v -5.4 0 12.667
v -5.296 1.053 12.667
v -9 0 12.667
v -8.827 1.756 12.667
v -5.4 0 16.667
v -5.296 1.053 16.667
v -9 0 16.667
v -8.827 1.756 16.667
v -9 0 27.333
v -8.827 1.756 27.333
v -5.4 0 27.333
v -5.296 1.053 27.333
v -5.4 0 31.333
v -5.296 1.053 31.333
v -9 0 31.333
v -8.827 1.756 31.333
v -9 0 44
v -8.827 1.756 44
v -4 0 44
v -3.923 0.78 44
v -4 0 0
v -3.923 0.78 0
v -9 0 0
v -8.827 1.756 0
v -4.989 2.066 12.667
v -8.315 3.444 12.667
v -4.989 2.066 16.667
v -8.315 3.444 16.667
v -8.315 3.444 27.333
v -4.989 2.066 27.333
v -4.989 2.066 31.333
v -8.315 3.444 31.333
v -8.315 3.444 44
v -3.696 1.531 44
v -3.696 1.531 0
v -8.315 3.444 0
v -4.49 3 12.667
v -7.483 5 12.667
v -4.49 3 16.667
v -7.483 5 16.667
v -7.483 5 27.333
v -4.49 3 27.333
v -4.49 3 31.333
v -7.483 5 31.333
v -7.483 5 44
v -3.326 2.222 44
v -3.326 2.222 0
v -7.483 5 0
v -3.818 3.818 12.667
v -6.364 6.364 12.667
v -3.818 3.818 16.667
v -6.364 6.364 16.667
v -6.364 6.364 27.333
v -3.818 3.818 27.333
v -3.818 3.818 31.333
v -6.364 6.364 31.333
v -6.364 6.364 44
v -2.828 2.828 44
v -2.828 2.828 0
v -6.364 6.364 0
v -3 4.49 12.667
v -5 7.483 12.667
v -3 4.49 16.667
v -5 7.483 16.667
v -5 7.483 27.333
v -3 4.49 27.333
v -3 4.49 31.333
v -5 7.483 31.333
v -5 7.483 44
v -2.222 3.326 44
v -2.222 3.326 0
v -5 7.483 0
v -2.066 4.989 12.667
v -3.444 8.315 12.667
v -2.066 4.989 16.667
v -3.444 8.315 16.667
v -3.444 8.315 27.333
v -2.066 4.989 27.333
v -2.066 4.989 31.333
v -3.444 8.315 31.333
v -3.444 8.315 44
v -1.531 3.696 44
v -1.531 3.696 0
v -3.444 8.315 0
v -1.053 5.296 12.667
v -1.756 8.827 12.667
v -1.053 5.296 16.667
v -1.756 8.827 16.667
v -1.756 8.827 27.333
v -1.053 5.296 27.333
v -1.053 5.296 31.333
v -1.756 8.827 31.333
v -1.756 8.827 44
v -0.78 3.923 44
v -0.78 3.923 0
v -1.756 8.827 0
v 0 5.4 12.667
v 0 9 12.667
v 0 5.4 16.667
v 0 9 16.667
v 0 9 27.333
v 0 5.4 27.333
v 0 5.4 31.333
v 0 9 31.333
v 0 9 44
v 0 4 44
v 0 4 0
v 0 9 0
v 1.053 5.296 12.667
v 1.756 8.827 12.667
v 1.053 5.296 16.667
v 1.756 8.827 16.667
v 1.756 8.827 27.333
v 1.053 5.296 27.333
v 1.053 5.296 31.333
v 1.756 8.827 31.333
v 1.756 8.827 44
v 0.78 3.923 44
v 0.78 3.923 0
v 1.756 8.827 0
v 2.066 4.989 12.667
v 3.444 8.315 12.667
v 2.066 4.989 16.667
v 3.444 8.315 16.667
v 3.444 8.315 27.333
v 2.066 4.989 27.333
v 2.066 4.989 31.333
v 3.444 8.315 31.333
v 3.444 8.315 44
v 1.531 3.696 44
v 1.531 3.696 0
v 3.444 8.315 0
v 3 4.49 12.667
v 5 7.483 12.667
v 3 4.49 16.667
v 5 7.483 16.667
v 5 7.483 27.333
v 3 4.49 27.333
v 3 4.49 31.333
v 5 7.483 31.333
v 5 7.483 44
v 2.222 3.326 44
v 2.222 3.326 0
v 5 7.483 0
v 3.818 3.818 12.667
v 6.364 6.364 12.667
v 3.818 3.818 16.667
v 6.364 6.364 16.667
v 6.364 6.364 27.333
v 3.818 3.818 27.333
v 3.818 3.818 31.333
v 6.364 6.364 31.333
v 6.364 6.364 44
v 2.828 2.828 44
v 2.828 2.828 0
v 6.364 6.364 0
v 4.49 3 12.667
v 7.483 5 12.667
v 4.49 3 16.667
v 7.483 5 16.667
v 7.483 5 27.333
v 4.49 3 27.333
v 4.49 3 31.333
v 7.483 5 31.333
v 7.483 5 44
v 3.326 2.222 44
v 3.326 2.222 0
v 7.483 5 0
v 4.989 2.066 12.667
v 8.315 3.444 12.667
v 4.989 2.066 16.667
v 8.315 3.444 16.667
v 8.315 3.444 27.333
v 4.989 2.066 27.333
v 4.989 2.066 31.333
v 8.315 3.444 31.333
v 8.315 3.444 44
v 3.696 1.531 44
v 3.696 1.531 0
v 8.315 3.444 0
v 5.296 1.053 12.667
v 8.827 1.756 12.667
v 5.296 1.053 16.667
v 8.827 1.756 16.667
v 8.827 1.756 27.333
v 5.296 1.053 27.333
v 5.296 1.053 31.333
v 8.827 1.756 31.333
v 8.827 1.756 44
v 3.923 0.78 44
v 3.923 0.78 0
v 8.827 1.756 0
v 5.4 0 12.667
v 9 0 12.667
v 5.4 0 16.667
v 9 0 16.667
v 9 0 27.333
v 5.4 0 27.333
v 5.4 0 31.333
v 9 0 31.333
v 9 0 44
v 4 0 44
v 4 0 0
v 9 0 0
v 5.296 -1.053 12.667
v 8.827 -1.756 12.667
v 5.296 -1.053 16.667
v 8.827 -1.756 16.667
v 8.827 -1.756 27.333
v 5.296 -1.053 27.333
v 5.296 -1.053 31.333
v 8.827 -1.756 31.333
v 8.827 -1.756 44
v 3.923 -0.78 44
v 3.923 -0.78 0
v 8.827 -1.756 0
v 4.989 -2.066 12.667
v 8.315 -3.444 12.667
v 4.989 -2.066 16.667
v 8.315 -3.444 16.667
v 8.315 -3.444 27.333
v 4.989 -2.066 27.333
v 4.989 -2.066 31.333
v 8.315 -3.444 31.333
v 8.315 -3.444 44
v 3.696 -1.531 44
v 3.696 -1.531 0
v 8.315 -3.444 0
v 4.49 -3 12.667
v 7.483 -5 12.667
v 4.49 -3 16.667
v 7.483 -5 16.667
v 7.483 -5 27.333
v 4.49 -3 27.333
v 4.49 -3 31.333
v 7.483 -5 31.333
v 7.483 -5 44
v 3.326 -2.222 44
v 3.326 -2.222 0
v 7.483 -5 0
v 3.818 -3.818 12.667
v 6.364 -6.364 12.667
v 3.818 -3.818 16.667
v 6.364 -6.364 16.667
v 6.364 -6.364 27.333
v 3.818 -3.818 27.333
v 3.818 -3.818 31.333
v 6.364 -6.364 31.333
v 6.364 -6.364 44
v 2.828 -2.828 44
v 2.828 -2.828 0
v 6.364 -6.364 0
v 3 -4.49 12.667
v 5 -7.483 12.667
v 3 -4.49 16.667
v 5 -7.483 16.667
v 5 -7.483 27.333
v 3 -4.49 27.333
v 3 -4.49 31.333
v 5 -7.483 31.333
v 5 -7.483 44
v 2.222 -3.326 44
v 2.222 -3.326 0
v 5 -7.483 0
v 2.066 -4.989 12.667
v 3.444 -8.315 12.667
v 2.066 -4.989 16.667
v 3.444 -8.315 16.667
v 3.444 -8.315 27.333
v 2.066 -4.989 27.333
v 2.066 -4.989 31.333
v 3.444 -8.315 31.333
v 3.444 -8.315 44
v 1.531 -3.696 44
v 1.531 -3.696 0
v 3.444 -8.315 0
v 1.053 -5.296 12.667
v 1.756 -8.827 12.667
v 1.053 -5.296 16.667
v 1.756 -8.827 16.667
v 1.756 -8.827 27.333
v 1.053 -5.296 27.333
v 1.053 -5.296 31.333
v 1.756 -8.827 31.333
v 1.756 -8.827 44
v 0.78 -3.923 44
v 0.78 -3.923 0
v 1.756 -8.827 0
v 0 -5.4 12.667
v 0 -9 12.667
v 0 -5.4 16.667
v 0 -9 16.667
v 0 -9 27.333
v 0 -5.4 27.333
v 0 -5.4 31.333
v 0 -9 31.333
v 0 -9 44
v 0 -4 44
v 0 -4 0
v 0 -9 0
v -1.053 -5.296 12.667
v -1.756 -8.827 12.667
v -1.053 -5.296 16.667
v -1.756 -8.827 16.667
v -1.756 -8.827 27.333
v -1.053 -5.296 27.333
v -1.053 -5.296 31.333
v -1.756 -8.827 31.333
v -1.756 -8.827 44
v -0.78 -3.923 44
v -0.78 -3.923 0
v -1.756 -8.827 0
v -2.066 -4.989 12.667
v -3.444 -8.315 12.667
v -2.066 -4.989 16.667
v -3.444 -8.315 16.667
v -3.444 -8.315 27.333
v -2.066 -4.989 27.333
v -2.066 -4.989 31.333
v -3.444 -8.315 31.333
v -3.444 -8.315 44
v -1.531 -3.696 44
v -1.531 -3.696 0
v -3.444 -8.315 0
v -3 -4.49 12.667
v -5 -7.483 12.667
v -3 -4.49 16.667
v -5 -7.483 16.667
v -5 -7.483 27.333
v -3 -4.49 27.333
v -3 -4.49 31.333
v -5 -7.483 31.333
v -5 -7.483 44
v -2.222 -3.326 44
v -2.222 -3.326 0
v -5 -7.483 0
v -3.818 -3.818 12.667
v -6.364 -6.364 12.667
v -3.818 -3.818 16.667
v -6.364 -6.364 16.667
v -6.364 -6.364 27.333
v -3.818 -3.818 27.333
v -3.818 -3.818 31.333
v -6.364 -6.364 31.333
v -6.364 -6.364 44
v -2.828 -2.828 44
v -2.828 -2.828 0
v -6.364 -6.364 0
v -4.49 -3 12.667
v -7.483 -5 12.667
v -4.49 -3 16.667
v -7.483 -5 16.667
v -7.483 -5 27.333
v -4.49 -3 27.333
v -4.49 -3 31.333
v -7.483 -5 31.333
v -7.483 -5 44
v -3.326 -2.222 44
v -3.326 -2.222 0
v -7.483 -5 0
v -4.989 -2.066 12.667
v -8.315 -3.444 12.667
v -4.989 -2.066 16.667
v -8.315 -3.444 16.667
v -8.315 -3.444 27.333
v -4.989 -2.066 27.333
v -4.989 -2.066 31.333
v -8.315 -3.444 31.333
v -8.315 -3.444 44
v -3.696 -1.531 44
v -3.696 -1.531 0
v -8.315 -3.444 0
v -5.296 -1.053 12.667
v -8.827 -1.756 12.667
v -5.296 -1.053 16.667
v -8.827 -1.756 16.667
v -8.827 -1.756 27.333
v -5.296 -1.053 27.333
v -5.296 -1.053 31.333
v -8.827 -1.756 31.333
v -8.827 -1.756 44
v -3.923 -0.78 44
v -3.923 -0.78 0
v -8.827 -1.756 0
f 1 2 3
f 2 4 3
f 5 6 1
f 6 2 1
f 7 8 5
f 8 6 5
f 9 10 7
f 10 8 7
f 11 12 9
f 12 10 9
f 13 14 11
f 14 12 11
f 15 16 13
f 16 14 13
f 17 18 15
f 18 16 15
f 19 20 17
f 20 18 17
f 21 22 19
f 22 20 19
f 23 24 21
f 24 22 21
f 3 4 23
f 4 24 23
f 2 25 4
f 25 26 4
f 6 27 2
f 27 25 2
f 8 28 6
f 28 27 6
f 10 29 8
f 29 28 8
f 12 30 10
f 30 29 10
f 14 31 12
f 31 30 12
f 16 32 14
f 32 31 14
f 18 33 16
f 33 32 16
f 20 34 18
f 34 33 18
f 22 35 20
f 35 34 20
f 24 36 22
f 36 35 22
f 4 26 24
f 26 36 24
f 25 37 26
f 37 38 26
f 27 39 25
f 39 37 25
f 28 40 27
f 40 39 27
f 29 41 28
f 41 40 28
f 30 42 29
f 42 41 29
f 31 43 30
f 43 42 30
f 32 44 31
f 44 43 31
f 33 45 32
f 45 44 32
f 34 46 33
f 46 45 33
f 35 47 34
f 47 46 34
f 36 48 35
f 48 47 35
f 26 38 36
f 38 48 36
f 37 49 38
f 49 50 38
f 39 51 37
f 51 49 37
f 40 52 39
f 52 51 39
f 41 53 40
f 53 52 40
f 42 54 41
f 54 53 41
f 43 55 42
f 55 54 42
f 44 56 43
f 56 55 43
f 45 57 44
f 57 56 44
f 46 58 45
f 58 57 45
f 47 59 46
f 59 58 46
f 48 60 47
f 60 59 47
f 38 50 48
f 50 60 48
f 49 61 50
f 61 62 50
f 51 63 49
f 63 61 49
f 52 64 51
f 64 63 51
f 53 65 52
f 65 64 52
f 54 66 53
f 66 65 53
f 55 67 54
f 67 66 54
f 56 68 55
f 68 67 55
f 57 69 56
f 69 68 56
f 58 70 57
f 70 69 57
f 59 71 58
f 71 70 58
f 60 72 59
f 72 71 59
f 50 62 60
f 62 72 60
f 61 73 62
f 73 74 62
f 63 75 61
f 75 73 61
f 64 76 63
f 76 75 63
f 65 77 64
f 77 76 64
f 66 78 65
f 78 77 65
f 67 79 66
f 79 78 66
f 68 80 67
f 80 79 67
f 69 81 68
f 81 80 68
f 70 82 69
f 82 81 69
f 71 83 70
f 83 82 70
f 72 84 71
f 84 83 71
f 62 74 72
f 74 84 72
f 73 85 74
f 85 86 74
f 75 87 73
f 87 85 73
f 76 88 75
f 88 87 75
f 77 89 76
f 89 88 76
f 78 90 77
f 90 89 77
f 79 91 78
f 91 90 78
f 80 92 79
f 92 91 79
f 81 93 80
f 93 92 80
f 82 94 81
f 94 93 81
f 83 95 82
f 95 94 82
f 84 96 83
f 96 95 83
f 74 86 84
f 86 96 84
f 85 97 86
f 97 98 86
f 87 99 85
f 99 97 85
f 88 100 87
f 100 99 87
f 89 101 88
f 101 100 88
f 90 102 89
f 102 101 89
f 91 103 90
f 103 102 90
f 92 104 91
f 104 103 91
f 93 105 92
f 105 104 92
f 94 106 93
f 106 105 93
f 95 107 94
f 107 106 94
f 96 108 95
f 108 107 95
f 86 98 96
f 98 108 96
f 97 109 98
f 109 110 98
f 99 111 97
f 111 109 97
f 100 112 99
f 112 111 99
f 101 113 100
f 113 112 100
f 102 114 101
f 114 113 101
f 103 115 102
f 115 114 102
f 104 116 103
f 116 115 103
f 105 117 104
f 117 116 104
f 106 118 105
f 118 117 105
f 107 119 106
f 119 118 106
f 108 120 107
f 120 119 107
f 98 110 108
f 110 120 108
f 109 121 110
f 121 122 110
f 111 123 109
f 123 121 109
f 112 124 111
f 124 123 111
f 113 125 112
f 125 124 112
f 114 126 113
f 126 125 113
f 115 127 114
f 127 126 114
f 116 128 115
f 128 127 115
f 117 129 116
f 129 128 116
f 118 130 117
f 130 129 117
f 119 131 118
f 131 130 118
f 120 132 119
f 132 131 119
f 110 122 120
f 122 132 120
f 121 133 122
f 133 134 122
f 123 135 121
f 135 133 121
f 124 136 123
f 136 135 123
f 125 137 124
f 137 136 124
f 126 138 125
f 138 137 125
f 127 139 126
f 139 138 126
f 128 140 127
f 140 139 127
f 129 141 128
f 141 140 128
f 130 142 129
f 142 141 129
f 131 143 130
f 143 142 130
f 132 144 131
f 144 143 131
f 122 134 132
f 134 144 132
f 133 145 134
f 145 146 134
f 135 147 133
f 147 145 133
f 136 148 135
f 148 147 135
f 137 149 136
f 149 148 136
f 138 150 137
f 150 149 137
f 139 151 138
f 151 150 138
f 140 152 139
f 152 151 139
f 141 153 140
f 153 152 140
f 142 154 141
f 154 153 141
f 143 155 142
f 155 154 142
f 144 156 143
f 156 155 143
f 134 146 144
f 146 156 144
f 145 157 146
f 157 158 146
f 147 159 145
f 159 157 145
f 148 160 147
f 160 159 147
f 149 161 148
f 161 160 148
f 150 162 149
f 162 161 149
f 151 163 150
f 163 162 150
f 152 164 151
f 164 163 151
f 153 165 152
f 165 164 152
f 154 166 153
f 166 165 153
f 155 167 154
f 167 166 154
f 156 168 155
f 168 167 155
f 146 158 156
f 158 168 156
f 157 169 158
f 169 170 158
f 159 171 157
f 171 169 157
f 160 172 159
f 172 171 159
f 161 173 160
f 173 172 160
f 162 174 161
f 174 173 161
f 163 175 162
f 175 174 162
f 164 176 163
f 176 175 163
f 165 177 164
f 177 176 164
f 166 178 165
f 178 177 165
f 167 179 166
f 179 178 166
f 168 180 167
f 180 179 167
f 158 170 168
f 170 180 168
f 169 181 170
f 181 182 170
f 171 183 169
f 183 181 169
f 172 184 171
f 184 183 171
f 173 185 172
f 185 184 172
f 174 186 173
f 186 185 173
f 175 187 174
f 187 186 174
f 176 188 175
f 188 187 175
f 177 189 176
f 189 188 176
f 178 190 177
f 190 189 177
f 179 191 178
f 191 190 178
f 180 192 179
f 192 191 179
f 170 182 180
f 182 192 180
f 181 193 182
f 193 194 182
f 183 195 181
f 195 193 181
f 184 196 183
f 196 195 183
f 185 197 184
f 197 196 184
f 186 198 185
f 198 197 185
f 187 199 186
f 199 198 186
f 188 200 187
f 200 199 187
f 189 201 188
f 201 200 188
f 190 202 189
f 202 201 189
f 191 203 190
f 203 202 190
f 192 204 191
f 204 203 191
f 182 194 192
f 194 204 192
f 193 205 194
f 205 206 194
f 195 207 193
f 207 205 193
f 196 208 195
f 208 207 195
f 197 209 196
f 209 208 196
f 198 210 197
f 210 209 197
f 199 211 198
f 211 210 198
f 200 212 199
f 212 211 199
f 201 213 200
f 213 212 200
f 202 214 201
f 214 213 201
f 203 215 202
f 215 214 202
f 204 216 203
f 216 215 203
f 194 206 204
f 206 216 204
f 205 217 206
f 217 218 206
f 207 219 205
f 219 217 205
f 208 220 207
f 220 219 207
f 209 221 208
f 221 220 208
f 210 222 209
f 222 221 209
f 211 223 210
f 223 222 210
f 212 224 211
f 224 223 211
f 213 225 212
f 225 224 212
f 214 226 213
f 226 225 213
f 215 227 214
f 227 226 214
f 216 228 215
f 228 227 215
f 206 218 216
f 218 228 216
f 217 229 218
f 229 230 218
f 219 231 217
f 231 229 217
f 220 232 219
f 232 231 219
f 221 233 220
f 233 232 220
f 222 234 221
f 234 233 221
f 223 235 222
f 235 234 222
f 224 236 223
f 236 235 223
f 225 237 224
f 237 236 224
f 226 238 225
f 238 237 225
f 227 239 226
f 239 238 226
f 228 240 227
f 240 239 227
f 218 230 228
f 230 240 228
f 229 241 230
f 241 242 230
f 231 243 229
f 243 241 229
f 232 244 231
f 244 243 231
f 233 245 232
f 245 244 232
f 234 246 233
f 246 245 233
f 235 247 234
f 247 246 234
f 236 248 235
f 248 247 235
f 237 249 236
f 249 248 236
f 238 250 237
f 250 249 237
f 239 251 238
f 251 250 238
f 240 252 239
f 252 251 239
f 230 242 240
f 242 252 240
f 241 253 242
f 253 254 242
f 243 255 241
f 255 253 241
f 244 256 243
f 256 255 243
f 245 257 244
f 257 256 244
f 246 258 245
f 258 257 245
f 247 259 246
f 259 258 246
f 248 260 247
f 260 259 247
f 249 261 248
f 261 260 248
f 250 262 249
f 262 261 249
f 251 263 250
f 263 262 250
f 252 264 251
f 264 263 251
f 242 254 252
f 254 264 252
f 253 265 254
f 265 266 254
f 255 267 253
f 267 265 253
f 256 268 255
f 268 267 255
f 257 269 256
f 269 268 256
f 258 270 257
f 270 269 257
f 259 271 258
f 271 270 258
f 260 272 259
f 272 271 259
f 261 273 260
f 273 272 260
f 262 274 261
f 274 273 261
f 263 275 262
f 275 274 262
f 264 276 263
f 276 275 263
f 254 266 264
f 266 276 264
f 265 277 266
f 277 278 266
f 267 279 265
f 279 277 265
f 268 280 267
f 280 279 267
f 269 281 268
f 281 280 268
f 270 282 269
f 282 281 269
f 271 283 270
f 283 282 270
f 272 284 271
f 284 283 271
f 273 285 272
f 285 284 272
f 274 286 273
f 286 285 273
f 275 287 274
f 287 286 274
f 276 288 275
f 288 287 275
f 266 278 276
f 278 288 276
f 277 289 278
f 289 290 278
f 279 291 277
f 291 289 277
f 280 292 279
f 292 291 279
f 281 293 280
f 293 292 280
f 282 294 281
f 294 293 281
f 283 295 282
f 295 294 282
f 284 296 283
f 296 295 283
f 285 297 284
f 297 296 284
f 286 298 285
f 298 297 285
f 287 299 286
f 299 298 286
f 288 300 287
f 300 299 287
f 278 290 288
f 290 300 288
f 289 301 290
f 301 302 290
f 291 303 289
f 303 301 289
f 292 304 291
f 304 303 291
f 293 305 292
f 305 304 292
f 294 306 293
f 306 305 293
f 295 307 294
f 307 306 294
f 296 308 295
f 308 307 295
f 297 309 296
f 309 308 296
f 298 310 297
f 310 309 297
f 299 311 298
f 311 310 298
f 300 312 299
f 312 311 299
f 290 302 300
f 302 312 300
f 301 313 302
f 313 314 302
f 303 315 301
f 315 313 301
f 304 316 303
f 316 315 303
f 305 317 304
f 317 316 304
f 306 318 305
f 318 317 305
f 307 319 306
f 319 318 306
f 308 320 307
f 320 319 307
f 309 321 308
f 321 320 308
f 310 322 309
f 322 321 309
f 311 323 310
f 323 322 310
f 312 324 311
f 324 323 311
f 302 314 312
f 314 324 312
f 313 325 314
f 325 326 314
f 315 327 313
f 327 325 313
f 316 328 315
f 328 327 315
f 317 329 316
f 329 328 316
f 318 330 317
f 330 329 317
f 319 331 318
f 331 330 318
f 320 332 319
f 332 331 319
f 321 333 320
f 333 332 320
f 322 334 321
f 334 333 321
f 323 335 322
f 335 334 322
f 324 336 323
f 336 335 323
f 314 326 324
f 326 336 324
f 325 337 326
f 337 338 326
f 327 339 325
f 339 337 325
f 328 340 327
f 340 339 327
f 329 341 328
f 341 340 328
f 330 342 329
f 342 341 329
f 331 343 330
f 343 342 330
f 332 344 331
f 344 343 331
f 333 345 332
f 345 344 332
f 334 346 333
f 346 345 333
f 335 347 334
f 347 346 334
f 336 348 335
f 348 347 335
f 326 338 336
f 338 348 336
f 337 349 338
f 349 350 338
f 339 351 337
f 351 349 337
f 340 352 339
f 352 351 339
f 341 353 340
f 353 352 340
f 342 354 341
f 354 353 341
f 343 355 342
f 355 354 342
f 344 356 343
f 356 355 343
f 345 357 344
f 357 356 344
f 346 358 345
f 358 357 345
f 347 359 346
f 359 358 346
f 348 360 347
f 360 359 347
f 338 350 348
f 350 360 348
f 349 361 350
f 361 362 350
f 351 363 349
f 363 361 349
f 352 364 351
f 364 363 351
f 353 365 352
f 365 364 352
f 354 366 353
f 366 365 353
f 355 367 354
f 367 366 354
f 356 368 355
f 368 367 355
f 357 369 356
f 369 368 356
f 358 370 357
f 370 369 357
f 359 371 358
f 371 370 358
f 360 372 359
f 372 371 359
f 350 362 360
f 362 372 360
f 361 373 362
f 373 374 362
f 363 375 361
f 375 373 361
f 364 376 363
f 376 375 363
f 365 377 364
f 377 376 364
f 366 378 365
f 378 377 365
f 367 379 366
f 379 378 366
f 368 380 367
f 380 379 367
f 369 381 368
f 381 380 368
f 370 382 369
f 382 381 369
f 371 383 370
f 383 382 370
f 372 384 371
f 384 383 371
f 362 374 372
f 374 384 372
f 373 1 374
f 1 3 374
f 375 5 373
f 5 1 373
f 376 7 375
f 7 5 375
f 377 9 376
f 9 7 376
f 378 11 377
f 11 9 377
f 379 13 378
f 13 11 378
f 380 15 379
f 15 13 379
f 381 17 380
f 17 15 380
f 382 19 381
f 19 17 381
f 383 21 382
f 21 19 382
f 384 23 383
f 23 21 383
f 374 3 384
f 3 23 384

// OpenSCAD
$fn = 32;

// ----------------------------------------------------------------------
// Grooved revolve: stepped, bore R4
// ----------------------------------------------------------------------

// --- parameters (mm) ---
bore_r = 4;               // bore radius
outer_r = 9;              // outer radius of the body
total_h = 44;             // overall height, Z
wall = 5;                 // radial wall thickness
groove_w = 4;             // groove width
groove_d = 3.6;           // groove depth
grooves = 2;              // number of outer grooves

bbox_x = 2 * outer_r;  // full diameter
bore_d = 2 * bore_r;  // bore diameter
body_d = 2 * outer_r;  // body diameter
revolve_angle = 360;  // full turn around the Z axis

profile = [[4, 0], [9, 0], [9, 12.667], [5.4, 12.667], [5.4, 16.667], [9, 16.667], [9, 27.333], [5.4, 27.333], [5.4, 31.333], [9, 31.333], [9, 44], [4, 44]];  // primary outline, 12 points, counter clockwise

// --- the one profile operation ---
rotate_extrude(angle = revolve_angle) polygon(points = profile);
